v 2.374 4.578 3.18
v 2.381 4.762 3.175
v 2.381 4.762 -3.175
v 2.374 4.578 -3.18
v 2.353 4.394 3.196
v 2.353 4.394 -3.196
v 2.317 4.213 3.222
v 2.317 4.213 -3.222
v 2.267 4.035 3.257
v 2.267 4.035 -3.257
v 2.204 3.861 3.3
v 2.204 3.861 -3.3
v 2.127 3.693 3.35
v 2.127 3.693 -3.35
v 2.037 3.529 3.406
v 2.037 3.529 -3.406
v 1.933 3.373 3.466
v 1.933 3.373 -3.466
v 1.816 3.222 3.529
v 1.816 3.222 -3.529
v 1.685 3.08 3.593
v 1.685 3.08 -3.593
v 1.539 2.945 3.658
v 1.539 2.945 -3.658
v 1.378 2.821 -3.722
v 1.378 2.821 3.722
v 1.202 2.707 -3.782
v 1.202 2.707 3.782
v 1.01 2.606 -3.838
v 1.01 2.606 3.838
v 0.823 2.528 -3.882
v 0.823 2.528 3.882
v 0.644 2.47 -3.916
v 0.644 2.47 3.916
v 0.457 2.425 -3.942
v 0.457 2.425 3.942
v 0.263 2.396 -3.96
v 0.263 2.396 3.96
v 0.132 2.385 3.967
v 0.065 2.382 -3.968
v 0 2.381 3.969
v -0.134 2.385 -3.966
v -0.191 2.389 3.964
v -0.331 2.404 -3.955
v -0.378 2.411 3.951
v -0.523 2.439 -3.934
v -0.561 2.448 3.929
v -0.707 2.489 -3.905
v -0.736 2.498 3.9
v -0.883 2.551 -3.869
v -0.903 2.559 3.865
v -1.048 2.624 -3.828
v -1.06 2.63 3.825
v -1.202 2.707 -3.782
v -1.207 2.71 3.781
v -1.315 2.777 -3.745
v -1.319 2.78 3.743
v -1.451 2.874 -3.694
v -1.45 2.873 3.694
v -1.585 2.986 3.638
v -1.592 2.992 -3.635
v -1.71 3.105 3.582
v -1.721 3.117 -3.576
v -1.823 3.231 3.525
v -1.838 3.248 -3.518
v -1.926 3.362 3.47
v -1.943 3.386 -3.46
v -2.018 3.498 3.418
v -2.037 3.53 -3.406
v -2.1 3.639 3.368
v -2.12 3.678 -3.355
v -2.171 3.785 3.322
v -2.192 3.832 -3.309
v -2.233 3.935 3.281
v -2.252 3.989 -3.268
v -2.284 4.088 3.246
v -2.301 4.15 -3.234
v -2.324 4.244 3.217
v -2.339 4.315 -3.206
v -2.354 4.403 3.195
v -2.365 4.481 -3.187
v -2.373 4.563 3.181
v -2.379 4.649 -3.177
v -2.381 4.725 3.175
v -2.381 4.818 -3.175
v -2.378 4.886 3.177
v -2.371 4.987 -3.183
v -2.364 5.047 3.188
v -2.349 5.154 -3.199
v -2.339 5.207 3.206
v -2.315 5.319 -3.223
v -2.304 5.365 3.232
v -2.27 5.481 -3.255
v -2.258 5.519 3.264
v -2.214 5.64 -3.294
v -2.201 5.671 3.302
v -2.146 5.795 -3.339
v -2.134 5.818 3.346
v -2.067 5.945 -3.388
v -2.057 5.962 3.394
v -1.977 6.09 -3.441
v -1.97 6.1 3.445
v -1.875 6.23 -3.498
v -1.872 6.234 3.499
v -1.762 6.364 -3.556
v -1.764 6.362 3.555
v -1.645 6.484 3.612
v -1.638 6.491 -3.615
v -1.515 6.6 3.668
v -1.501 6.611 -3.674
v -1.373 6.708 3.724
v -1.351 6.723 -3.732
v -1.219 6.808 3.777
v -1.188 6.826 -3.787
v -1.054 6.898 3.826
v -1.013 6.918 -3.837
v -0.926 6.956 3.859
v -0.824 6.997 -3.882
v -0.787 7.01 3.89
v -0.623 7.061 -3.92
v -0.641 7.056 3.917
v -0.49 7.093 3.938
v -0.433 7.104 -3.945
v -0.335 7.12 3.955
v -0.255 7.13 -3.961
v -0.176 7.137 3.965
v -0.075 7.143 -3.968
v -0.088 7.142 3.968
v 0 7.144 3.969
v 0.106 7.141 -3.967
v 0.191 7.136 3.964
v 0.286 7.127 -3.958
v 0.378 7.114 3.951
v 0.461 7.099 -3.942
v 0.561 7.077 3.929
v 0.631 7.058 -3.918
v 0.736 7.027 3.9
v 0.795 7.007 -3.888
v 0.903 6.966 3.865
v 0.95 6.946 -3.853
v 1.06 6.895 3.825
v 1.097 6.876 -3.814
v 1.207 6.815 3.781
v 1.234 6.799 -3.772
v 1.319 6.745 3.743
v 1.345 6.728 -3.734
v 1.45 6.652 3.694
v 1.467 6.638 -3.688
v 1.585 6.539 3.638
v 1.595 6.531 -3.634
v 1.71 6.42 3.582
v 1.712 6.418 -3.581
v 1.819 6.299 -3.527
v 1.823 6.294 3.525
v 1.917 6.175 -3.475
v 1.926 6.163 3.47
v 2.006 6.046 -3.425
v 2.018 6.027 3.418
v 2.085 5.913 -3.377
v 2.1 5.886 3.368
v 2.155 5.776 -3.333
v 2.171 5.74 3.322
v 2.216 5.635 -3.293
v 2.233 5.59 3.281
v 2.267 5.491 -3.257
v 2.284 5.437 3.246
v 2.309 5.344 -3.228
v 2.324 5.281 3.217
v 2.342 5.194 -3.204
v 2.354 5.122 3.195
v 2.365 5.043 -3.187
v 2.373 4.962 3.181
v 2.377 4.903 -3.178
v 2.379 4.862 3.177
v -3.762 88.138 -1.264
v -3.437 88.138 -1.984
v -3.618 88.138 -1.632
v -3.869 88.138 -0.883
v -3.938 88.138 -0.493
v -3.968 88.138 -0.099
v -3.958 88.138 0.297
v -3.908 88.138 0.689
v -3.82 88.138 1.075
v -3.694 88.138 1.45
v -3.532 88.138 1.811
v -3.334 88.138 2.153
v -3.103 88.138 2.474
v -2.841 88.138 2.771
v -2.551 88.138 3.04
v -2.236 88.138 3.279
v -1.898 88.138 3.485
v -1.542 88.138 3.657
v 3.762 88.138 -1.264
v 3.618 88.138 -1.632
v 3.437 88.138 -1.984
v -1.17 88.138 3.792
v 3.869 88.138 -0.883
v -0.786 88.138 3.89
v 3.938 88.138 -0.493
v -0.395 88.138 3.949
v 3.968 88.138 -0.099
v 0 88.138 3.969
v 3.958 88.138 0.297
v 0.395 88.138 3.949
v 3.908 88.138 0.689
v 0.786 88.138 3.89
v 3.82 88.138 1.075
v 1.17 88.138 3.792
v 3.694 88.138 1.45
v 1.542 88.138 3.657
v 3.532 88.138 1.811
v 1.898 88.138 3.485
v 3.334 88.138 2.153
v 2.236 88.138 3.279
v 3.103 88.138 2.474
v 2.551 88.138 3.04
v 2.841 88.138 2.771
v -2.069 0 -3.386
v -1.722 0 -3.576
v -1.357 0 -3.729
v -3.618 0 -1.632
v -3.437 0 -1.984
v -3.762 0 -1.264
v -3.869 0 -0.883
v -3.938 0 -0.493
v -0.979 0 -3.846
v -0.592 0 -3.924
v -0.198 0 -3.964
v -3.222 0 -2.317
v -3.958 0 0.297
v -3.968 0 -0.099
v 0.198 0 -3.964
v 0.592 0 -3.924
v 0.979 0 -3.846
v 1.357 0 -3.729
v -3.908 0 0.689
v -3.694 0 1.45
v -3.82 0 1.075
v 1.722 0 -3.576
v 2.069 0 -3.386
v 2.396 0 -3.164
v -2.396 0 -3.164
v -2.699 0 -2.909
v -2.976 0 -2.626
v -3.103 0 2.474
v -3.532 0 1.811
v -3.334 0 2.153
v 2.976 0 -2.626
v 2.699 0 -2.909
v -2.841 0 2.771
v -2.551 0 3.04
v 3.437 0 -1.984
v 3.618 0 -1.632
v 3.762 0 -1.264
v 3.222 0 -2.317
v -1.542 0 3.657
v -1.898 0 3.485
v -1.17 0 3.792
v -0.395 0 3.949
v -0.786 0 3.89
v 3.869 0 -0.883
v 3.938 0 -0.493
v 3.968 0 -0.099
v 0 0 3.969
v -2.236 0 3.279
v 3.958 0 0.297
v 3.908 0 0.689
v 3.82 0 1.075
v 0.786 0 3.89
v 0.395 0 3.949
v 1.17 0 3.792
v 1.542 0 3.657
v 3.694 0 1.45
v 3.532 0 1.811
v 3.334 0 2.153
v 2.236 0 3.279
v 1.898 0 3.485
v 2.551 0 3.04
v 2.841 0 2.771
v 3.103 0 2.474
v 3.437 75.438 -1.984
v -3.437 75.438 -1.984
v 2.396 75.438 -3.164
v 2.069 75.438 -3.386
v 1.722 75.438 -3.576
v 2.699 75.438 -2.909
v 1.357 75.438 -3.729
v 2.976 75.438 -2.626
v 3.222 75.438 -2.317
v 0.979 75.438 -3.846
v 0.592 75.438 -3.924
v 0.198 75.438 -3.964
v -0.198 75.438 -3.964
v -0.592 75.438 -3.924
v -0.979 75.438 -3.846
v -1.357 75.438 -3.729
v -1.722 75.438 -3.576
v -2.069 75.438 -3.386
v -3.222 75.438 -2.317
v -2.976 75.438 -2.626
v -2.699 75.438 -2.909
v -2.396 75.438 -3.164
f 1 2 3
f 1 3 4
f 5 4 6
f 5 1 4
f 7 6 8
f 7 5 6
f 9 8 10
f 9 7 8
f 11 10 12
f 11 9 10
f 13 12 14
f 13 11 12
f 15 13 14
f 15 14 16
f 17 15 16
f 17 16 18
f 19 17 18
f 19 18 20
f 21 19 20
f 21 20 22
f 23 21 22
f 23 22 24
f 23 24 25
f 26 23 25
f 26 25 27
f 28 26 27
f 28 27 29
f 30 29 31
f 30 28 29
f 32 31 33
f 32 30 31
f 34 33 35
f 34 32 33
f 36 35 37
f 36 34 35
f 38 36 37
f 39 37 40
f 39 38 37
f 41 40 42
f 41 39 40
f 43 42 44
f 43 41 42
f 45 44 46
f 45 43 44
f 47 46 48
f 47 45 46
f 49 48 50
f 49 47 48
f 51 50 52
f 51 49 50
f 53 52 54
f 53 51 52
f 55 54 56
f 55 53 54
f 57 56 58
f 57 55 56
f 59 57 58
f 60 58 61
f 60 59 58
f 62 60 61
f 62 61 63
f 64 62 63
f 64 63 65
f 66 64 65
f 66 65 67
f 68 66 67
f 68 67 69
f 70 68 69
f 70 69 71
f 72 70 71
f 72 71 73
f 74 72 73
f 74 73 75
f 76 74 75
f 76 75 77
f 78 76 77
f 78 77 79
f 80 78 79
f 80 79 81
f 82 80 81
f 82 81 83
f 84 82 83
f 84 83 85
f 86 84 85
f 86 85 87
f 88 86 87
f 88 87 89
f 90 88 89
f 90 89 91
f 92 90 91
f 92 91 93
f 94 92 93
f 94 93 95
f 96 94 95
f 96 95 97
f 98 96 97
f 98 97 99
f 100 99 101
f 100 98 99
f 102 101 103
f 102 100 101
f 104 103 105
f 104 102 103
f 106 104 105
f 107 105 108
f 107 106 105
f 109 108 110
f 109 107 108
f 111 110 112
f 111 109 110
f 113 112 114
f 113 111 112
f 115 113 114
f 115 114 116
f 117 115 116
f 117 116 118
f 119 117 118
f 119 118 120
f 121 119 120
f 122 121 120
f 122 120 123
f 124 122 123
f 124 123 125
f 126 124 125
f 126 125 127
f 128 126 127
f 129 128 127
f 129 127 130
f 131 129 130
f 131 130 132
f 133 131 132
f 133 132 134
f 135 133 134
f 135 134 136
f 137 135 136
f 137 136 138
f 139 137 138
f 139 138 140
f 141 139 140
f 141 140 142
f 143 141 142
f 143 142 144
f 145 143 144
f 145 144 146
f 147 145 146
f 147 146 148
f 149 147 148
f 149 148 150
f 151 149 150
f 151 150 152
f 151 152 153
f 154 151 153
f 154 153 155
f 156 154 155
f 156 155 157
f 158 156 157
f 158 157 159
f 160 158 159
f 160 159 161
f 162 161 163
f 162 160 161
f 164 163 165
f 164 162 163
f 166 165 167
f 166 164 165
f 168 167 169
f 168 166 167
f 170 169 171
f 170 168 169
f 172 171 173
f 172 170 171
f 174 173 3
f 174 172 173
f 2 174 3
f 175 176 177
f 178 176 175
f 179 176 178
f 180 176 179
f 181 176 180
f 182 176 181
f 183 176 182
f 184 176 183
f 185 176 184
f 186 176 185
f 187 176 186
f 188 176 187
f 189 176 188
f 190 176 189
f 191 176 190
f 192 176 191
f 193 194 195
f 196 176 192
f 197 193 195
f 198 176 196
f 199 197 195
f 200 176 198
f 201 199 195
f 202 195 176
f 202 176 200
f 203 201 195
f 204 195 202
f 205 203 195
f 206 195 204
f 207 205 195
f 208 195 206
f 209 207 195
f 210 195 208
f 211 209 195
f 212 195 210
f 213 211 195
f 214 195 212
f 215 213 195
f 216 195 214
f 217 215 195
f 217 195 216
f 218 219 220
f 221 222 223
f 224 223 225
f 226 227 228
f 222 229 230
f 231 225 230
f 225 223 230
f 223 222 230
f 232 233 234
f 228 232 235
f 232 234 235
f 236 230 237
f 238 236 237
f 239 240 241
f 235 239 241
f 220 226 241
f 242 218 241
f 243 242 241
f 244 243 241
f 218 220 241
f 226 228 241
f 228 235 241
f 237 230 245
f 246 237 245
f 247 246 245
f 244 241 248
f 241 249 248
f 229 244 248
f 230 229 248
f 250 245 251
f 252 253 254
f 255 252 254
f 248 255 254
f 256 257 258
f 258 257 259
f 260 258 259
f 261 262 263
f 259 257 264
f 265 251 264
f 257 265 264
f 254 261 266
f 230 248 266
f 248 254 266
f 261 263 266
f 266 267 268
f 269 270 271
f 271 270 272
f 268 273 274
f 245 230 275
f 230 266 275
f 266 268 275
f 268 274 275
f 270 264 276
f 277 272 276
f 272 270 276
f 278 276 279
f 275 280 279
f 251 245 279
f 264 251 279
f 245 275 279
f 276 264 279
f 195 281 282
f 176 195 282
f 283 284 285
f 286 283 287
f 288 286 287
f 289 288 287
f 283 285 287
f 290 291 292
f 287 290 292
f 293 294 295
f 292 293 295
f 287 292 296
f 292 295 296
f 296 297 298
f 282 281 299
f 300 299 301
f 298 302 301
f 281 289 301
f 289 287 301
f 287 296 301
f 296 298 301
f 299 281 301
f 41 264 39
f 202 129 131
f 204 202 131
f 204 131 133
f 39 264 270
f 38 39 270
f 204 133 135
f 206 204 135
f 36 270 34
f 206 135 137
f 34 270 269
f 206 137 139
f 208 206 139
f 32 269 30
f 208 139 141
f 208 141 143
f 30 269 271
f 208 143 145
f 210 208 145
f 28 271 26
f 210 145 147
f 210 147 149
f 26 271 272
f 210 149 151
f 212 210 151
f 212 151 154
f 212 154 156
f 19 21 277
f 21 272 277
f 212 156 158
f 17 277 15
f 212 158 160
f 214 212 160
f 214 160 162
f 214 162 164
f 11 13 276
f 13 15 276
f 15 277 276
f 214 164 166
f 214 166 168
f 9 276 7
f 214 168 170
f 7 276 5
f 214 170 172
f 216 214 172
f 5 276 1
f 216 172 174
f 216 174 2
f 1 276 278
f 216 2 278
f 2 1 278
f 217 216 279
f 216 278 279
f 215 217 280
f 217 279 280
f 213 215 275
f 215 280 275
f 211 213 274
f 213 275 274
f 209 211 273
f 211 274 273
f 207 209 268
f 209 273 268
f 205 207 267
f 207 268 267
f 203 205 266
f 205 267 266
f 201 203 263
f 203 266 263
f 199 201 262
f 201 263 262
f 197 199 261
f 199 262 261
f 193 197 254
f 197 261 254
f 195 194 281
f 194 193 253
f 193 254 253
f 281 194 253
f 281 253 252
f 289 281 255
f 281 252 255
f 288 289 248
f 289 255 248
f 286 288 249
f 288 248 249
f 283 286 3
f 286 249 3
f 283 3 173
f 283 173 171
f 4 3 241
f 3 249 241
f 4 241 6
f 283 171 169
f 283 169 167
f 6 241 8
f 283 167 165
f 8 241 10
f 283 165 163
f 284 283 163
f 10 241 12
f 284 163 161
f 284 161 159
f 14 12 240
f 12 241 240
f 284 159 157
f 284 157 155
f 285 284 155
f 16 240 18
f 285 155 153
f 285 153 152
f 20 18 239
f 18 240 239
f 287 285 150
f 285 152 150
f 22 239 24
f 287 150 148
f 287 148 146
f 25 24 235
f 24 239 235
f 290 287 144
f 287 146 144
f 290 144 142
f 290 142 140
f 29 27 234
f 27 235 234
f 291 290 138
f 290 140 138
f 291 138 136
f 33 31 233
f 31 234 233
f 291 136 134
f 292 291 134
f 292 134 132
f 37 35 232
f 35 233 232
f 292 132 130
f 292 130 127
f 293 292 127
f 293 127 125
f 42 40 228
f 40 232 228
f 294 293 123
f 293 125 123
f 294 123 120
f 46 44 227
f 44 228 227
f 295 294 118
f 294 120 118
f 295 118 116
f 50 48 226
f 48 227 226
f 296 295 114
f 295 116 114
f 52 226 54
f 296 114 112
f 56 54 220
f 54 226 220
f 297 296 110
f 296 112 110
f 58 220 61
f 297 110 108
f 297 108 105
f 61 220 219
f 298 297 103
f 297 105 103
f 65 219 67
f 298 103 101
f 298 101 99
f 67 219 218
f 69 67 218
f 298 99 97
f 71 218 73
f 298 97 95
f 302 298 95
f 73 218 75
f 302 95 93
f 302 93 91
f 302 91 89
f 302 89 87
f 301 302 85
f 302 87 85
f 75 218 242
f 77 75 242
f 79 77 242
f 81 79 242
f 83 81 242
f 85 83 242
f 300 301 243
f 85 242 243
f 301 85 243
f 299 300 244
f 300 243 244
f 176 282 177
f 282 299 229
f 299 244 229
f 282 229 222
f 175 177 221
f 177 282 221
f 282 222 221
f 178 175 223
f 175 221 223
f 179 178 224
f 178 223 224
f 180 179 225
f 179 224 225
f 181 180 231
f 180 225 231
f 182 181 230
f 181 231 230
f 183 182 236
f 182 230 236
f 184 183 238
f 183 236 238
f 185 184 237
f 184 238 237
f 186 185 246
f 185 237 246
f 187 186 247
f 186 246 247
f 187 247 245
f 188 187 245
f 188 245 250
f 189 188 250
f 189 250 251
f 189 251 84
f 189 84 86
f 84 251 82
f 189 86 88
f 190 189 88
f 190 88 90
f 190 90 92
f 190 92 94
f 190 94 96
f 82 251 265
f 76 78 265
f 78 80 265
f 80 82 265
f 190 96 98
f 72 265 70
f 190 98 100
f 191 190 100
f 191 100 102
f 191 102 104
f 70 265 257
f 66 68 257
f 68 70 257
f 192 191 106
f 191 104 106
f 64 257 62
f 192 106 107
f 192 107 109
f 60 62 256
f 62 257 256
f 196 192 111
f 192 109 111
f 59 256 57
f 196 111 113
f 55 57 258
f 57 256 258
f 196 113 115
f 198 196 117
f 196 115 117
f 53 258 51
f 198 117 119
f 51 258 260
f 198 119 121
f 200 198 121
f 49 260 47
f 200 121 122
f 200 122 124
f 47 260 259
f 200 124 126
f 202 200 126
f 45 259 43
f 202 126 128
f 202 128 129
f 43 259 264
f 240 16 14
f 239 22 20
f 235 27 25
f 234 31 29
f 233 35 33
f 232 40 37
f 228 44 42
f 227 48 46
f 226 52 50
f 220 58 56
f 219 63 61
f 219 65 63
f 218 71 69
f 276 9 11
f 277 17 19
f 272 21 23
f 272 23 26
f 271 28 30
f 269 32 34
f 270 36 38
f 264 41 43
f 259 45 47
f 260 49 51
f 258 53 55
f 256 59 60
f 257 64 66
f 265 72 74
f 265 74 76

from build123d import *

# Parameters (mm, degrees)
SKETCH1_R               = 3.96875
BOSS_EXTRUDE1_DEPTH     = 88.138
CUT_EXTRUDE1_DEPTH      = 12.7
CUT_EXTRUDE2_DEPTH      = 12.7
CUT_EXTRUDE2_DEPTH_BACK = 12.7
SKETCH3_R               = 2.38125


with BuildPart() as part:
    # Sketch1 → Boss-Extrude1 (new body)
    with BuildSketch(Plane(origin=(0, 0, 0), x_dir=(1, 0, 0), z_dir=(0, 1, 0))):
        Circle(SKETCH1_R)
    extrude(amount=BOSS_EXTRUDE1_DEPTH)

    # Sketch2 → Cut-Extrude1 (cut)
    with BuildSketch(Plane(origin=(0, 88.138, 0), x_dir=(1, 0, 0), z_dir=(0, 1, 0))):
        Polygon((3.437038321, 1.984375), (-3.437038321, 1.984375), (-4.719395918, 2.522465653), (-2.590204502, 6.353236507), (2.456720437, 4.728926773), align=None)
    extrude(amount=-CUT_EXTRUDE1_DEPTH, mode=Mode.SUBTRACT)

    # Sketch3 → Cut-Extrude2 (cut, two sides: drawn at the far end of the back side and taken through both)
    with BuildSketch(Plane(origin=(0, 0, -1.984375), x_dir=(-1, 0, 0), z_dir=(0, 0, -1)).offset(-CUT_EXTRUDE2_DEPTH_BACK)):
        with Locations((0, 4.7625)):
            Circle(SKETCH3_R)
    extrude(amount=CUT_EXTRUDE2_DEPTH + CUT_EXTRUDE2_DEPTH_BACK, mode=Mode.SUBTRACT)


solid = part.part
